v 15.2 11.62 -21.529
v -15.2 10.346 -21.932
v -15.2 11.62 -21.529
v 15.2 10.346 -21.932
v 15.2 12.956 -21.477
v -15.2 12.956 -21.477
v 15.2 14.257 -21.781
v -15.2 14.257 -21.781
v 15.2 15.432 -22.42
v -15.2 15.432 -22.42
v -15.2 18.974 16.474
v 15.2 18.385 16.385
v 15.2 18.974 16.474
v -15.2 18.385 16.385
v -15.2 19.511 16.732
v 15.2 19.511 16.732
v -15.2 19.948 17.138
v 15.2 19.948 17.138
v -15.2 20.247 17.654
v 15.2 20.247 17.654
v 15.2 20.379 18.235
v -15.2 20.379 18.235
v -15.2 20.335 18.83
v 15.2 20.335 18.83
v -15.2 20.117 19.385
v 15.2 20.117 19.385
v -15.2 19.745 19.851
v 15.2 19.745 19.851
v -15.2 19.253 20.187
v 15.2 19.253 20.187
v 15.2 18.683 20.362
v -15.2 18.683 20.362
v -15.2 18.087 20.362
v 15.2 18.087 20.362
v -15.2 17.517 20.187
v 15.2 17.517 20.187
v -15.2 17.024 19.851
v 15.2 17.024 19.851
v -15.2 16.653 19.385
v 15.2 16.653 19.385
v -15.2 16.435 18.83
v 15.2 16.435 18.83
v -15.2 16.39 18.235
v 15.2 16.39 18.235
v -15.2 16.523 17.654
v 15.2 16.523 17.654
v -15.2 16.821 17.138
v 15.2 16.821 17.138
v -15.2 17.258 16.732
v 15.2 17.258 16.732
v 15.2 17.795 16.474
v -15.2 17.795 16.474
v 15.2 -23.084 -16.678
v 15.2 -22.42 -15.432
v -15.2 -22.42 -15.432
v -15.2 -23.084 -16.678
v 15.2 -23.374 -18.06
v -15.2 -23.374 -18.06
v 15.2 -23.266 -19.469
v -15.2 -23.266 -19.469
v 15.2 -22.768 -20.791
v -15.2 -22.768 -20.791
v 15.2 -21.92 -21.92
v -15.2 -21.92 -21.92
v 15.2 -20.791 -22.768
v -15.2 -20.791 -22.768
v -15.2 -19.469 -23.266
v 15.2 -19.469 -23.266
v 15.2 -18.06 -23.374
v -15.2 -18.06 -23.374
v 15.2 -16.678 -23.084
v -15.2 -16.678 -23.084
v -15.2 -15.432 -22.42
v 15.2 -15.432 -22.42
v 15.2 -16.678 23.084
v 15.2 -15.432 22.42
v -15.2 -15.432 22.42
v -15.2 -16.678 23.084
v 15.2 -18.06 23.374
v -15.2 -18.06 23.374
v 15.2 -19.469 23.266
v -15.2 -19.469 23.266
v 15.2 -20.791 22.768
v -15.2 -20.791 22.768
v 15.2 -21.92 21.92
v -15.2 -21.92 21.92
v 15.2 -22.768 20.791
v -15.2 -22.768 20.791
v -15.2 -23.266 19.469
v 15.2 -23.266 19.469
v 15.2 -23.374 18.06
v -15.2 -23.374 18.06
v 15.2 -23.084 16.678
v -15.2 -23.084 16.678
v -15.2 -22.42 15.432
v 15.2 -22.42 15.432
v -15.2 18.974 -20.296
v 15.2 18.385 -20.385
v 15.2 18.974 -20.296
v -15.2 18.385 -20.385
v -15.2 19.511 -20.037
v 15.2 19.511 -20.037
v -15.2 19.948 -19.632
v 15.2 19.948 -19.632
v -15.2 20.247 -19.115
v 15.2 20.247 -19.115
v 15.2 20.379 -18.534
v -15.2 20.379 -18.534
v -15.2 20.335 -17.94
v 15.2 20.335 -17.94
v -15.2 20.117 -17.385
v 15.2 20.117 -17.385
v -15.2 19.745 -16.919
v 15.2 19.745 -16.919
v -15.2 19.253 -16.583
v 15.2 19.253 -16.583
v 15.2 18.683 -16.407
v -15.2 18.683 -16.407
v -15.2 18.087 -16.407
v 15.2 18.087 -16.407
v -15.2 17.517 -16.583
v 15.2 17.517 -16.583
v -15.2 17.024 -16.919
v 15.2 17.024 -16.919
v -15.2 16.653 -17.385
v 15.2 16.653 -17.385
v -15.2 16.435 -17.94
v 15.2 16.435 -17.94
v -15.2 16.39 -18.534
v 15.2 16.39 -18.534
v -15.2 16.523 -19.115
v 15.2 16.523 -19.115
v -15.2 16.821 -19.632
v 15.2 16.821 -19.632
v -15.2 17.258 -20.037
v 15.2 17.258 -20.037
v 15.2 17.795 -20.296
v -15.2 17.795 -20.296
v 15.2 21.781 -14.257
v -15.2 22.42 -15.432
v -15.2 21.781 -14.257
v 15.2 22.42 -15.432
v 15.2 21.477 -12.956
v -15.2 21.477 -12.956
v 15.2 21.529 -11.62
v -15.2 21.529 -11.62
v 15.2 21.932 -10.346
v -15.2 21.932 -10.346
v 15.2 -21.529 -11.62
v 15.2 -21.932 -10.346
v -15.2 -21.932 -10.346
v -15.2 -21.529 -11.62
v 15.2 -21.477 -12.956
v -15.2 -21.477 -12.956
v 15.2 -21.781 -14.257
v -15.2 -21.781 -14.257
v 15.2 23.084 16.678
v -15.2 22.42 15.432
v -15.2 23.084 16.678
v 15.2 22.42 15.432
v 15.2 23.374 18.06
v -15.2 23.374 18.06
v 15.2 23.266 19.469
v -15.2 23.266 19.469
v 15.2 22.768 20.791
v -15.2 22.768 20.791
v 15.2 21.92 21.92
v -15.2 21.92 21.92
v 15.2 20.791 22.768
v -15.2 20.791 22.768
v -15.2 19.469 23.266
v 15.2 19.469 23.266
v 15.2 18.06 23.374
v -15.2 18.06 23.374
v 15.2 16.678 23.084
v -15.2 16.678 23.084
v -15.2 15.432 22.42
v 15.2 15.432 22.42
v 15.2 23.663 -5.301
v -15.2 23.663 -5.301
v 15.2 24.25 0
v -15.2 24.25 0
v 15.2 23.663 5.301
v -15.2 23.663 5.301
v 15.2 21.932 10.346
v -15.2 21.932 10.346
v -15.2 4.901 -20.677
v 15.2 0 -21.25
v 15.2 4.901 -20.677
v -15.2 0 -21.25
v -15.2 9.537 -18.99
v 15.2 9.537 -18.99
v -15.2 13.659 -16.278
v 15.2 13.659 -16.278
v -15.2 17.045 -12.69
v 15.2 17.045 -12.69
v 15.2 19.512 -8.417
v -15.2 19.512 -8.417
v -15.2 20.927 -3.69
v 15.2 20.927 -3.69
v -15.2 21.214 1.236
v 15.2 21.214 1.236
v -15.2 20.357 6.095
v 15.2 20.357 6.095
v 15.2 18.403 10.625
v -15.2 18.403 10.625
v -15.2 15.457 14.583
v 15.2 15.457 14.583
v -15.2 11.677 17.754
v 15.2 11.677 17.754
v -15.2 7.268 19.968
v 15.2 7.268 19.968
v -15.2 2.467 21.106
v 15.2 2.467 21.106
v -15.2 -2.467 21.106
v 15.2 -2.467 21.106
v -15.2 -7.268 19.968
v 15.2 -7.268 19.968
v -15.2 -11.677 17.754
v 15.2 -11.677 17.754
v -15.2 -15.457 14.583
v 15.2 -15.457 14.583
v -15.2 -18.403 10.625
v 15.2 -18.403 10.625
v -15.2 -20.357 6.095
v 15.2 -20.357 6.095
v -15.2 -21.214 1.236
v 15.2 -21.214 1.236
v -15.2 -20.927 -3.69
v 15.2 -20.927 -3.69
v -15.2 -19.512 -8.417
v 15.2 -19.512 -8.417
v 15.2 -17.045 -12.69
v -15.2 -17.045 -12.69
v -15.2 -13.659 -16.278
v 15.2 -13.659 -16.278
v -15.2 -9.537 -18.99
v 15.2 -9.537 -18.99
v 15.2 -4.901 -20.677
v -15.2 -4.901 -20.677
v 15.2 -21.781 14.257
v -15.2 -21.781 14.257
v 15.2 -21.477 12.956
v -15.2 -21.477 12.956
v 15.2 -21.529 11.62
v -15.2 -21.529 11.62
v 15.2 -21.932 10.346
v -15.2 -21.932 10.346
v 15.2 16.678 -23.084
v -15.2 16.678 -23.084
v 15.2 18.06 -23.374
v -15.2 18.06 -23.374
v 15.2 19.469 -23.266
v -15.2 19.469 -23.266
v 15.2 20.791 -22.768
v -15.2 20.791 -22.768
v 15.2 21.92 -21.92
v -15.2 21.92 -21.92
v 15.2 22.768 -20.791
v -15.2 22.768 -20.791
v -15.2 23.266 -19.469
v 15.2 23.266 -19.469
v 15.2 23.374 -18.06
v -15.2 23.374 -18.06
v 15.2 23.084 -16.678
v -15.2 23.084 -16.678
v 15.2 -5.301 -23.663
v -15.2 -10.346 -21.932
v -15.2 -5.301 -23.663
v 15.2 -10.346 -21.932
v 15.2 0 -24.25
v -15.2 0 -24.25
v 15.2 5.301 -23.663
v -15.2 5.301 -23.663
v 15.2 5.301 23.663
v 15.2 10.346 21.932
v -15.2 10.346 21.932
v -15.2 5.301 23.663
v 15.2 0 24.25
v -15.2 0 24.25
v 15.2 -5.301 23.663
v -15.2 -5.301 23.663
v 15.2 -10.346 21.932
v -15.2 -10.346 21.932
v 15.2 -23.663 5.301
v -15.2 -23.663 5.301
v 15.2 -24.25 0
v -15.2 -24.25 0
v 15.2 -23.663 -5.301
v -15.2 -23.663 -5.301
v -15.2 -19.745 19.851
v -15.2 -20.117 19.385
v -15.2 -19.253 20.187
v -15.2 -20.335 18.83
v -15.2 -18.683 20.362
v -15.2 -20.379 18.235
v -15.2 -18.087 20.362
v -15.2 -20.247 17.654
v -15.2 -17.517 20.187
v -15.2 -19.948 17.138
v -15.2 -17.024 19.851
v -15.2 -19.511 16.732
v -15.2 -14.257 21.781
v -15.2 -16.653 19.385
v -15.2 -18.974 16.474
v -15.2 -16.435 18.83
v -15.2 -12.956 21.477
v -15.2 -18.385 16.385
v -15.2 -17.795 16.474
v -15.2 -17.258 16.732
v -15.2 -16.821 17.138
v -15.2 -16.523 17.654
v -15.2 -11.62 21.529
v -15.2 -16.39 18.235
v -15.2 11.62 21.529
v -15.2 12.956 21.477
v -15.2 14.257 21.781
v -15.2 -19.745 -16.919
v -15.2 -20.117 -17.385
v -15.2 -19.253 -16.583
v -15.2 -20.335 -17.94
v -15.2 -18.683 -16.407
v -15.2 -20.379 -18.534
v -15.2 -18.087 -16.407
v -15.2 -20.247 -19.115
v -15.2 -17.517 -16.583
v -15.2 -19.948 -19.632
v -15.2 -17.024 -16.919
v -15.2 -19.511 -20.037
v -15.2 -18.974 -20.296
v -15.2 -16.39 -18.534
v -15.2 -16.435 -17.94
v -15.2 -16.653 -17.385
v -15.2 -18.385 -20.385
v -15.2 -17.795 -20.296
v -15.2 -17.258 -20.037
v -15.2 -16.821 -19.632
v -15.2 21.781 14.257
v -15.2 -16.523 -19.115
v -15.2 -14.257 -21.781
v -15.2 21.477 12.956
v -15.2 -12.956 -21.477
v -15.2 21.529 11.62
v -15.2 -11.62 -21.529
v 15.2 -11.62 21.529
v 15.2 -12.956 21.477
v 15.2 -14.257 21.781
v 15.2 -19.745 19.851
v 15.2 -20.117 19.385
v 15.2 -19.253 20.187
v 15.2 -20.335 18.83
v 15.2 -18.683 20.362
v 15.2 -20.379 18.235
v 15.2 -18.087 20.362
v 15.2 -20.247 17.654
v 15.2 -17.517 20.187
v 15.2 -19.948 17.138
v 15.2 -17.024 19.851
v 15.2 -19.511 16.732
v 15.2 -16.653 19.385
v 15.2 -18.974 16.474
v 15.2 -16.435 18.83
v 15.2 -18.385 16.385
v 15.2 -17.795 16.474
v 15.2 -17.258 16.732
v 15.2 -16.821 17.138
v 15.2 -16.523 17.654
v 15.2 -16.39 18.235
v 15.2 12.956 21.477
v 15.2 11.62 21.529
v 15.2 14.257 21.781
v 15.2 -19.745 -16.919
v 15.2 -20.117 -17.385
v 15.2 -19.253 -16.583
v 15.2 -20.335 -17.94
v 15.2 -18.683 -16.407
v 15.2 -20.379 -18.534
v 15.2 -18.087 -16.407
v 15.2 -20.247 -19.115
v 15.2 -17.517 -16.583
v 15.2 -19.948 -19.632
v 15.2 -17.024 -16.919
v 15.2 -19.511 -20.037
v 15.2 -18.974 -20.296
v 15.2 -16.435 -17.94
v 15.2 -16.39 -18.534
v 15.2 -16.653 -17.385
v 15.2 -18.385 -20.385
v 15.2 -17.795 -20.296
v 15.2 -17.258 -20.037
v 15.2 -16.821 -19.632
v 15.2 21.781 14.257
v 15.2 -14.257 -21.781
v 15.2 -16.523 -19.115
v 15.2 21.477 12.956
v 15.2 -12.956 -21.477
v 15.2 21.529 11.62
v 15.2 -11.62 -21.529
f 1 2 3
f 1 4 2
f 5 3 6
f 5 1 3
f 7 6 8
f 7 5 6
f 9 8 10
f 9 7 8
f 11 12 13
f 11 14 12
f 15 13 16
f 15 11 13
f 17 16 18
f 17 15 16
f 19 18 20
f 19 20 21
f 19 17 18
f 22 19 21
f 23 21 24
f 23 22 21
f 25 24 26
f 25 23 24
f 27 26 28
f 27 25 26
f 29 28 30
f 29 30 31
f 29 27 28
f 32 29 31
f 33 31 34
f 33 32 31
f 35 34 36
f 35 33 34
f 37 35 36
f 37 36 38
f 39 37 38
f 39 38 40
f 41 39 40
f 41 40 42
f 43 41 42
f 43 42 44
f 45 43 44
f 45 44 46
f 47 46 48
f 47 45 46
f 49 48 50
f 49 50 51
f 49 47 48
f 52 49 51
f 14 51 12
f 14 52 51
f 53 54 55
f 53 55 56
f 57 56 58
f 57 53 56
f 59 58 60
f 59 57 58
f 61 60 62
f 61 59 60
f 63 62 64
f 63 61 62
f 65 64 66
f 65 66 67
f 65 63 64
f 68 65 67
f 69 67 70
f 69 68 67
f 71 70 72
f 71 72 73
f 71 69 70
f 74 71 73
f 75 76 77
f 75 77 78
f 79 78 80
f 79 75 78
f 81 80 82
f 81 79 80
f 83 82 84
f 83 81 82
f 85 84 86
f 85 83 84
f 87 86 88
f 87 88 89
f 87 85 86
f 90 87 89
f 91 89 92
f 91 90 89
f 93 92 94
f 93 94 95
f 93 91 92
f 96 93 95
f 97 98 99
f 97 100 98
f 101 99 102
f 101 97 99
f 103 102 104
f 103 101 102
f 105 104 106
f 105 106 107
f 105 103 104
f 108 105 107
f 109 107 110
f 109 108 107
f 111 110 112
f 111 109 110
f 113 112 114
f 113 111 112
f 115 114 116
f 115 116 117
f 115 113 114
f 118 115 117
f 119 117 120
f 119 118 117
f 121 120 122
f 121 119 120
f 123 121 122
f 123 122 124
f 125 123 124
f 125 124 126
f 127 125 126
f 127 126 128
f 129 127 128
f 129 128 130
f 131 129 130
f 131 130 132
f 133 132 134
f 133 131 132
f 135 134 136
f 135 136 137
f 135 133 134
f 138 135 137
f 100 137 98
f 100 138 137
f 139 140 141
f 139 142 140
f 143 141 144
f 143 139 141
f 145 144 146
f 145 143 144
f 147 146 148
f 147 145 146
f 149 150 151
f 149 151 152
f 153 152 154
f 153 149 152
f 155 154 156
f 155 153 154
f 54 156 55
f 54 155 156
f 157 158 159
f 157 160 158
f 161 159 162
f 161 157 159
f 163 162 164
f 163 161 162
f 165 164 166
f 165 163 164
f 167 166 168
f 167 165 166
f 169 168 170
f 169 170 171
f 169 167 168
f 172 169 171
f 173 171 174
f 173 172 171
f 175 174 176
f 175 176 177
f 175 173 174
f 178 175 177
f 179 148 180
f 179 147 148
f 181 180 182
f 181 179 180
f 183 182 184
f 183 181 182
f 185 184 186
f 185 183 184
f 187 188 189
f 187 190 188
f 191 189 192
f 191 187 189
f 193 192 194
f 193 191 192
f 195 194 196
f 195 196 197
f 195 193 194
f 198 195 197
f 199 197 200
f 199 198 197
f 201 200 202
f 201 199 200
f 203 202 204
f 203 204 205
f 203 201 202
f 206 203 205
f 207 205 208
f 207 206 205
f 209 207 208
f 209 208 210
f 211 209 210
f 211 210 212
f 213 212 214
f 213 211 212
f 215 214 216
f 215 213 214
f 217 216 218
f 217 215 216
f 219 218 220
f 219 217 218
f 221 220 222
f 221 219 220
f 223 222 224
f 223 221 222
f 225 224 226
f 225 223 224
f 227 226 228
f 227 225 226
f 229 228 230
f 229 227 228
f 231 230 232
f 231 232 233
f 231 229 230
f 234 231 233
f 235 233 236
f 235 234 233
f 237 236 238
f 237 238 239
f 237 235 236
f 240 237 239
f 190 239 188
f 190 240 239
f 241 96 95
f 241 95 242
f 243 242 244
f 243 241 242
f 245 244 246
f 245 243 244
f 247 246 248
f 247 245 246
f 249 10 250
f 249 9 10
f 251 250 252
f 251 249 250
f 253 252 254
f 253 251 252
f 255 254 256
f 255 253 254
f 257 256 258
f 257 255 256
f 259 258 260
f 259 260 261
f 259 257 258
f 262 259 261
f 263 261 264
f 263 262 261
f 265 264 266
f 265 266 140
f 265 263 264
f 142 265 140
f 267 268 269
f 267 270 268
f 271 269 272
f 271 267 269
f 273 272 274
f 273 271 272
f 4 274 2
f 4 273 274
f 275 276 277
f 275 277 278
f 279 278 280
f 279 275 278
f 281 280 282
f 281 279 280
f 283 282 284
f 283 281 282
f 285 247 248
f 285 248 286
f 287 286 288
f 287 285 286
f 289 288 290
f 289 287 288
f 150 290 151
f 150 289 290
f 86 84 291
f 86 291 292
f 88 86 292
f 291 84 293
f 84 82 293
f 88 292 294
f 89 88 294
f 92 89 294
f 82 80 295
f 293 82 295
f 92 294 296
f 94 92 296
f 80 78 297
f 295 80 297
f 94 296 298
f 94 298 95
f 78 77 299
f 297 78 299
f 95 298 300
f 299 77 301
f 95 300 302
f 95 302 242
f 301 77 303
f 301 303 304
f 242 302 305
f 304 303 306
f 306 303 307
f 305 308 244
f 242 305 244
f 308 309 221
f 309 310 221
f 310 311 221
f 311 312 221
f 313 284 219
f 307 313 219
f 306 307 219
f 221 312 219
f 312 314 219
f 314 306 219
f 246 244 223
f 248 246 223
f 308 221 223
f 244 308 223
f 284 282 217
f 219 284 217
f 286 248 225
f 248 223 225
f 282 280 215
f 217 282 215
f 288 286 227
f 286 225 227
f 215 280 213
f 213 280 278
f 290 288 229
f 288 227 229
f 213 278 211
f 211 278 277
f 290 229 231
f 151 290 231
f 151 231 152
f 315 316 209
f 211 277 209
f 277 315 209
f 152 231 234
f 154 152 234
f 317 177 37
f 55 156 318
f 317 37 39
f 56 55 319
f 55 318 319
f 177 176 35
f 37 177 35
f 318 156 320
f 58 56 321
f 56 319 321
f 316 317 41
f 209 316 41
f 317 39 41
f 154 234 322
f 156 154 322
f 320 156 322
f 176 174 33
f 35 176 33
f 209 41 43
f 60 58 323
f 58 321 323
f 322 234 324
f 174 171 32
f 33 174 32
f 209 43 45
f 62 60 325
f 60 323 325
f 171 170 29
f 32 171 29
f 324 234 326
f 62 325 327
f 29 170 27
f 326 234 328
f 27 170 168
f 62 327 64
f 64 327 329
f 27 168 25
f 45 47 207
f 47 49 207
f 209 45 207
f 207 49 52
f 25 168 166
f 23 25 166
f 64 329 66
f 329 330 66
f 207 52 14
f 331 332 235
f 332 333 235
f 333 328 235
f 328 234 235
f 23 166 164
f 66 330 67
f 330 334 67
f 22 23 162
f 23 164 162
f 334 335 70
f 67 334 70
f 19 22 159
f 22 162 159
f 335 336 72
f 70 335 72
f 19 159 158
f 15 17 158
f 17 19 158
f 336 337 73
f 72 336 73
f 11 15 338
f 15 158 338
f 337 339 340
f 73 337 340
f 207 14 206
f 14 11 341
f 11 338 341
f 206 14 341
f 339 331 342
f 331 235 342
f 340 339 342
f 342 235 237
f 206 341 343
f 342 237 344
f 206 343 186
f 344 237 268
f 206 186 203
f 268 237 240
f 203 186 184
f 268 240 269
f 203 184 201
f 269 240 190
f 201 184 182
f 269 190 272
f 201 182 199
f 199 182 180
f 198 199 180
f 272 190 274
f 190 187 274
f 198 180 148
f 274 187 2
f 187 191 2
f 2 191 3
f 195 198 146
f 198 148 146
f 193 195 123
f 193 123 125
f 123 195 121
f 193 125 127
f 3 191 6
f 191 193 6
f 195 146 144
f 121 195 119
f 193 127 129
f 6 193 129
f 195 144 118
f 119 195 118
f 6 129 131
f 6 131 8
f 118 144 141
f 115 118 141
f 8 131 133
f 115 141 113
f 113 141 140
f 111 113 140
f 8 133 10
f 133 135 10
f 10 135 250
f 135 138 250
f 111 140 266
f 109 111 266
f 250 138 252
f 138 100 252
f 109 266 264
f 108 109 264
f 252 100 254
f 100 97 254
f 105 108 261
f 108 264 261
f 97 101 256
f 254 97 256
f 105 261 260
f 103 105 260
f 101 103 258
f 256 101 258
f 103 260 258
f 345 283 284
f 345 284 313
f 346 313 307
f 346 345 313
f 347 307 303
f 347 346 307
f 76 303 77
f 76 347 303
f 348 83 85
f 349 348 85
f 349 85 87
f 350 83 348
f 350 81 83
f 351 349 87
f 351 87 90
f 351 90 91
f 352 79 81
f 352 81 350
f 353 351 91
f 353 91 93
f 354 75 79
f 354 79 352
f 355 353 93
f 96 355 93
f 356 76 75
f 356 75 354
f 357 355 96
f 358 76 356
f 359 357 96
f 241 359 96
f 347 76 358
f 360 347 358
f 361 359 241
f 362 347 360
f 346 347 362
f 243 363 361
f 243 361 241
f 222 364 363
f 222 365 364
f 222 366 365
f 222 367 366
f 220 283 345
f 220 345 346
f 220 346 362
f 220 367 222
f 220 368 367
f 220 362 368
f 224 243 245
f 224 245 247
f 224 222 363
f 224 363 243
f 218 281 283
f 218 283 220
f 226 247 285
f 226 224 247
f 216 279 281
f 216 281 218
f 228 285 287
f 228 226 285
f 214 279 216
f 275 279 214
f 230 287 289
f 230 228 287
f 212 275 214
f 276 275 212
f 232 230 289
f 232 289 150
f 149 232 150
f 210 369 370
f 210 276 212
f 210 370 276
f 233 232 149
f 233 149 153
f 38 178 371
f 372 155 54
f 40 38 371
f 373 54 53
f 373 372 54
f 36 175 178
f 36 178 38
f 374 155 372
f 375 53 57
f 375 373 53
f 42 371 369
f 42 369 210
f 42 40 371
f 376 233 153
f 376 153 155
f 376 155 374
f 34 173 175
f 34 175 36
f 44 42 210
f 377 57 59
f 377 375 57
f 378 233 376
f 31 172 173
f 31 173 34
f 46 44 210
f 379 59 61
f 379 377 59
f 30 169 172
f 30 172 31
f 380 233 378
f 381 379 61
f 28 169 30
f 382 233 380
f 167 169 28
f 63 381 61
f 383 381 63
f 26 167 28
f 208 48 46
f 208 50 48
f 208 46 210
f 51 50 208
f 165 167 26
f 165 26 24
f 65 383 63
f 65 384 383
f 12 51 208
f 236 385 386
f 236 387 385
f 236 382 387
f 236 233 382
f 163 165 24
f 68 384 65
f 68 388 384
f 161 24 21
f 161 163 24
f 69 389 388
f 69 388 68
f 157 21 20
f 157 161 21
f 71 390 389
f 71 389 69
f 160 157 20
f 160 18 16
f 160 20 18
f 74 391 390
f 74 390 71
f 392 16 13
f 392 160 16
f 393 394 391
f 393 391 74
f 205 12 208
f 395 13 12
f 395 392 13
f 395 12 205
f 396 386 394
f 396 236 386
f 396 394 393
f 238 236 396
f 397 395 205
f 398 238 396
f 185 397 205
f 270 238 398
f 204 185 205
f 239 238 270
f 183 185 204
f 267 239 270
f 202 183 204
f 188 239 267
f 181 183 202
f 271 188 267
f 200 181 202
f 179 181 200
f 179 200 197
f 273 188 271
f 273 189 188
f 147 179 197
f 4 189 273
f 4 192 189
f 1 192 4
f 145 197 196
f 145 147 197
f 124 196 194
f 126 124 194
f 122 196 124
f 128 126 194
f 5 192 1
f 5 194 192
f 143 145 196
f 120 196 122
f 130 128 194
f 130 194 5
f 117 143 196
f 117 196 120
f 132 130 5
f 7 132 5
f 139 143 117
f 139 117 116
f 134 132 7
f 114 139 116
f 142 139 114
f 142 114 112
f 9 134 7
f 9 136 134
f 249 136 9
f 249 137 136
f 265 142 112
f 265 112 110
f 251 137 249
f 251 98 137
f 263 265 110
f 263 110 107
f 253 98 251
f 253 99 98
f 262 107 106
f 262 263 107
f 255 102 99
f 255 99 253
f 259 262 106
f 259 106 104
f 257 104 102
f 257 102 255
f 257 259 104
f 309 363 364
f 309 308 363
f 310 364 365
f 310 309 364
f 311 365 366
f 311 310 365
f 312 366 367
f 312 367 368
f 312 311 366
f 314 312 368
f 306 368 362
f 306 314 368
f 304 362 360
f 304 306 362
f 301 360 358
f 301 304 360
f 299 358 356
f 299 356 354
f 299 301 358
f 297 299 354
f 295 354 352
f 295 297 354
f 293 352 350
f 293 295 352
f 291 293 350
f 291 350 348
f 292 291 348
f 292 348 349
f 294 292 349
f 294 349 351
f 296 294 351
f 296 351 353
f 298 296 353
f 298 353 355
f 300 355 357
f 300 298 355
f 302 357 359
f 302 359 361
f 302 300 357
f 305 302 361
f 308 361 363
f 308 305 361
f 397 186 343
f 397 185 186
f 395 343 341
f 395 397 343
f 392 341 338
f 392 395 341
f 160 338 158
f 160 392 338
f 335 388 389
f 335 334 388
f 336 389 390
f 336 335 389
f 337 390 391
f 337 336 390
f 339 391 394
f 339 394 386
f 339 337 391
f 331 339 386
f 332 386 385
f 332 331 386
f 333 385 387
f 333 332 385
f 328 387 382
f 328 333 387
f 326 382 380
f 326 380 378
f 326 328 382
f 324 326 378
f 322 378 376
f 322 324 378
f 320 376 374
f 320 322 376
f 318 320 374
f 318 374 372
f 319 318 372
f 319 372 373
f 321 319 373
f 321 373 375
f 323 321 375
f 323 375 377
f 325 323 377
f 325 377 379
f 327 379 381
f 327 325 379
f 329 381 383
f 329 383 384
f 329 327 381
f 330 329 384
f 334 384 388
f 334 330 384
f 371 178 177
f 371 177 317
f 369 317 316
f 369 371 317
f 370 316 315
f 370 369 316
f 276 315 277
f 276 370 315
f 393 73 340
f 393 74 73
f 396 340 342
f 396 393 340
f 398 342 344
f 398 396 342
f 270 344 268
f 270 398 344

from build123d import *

# Parameters (mm, degrees)
SKETCH_1_R      = 21.25
SKETCH_1_R_2    = 2
EXTRUDE_1_DEPTH = 15.2


with BuildPart() as part:
    # 草图1 → 凸台-拉伸1 (new body, symmetric)
    with BuildSketch(Plane(origin=(0, 0, 0), x_dir=(0, 0, -1), z_dir=(1, 0, 0))):
        with BuildLine():
            ThreePointArc((-15.431825442, 22.419634577), (-21.920310245, 21.920310245), (-22.419634577, 15.431825442))
            ThreePointArc((-22.419634577, 15.431825442), (-21.477282941, 12.955720303), (-21.932357291, 10.345733597))
            ThreePointArc((-21.932357291, 10.345733597), (-24.25, 0), (-21.932357291, -10.345733597))
            ThreePointArc((-21.932357291, -10.345733597), (-21.477282941, -12.955720303), (-22.419634577, -15.431825442))
            ThreePointArc((-22.419634577, -15.431825442), (-21.920310245, -21.920310245), (-15.431825442, -22.419634577))
            ThreePointArc((-15.431825442, -22.419634577), (-12.955720303, -21.477282941), (-10.345733597, -21.932357291))
            ThreePointArc((-10.345733597, -21.932357291), (0, -24.25), (10.345733597, -21.932357291))
            ThreePointArc((10.345733597, -21.932357291), (12.955720303, -21.477282941), (15.431825442, -22.419634577))
            ThreePointArc((15.431825442, -22.419634577), (21.920310245, -21.920310245), (22.419634577, -15.431825442))
            ThreePointArc((22.419634577, -15.431825442), (21.477282941, -12.955720303), (21.932357291, -10.345733597))
            ThreePointArc((21.932357291, -10.345733597), (24.25, 0), (21.932357291, 10.345733597))
            ThreePointArc((21.932357291, 10.345733597), (21.477282941, 12.955720303), (22.419634577, 15.431825442))
            ThreePointArc((22.419634577, 15.431825442), (21.920310245, 21.920310245), (15.431825442, 22.419634577))
            ThreePointArc((15.431825442, 22.419634577), (12.955720303, 21.477282941), (10.345733597, 21.932357291))
            ThreePointArc((10.345733597, 21.932357291), (0, 24.25), (-10.345733597, 21.932357291))
            ThreePointArc((-10.345733597, 21.932357291), (-12.955720303, 21.477282941), (-15.431825442, 22.419634577))
        make_face()
        Circle(SKETCH_1_R, mode=Mode.SUBTRACT)
        with Locations((-18.384776339, 18.384776339)):
            Circle(SKETCH_1_R_2, mode=Mode.SUBTRACT)
        with Locations((18.384776339, 18.384776339)):
            Circle(SKETCH_1_R_2, mode=Mode.SUBTRACT)
        with Locations((18.384776339, -18.384776339)):
            Circle(SKETCH_1_R_2, mode=Mode.SUBTRACT)
        with Locations((-18.384776339, -18.384776339)):
            Circle(SKETCH_1_R_2, mode=Mode.SUBTRACT)
    extrude(amount=EXTRUDE_1_DEPTH, both=True)


solid = part.part
